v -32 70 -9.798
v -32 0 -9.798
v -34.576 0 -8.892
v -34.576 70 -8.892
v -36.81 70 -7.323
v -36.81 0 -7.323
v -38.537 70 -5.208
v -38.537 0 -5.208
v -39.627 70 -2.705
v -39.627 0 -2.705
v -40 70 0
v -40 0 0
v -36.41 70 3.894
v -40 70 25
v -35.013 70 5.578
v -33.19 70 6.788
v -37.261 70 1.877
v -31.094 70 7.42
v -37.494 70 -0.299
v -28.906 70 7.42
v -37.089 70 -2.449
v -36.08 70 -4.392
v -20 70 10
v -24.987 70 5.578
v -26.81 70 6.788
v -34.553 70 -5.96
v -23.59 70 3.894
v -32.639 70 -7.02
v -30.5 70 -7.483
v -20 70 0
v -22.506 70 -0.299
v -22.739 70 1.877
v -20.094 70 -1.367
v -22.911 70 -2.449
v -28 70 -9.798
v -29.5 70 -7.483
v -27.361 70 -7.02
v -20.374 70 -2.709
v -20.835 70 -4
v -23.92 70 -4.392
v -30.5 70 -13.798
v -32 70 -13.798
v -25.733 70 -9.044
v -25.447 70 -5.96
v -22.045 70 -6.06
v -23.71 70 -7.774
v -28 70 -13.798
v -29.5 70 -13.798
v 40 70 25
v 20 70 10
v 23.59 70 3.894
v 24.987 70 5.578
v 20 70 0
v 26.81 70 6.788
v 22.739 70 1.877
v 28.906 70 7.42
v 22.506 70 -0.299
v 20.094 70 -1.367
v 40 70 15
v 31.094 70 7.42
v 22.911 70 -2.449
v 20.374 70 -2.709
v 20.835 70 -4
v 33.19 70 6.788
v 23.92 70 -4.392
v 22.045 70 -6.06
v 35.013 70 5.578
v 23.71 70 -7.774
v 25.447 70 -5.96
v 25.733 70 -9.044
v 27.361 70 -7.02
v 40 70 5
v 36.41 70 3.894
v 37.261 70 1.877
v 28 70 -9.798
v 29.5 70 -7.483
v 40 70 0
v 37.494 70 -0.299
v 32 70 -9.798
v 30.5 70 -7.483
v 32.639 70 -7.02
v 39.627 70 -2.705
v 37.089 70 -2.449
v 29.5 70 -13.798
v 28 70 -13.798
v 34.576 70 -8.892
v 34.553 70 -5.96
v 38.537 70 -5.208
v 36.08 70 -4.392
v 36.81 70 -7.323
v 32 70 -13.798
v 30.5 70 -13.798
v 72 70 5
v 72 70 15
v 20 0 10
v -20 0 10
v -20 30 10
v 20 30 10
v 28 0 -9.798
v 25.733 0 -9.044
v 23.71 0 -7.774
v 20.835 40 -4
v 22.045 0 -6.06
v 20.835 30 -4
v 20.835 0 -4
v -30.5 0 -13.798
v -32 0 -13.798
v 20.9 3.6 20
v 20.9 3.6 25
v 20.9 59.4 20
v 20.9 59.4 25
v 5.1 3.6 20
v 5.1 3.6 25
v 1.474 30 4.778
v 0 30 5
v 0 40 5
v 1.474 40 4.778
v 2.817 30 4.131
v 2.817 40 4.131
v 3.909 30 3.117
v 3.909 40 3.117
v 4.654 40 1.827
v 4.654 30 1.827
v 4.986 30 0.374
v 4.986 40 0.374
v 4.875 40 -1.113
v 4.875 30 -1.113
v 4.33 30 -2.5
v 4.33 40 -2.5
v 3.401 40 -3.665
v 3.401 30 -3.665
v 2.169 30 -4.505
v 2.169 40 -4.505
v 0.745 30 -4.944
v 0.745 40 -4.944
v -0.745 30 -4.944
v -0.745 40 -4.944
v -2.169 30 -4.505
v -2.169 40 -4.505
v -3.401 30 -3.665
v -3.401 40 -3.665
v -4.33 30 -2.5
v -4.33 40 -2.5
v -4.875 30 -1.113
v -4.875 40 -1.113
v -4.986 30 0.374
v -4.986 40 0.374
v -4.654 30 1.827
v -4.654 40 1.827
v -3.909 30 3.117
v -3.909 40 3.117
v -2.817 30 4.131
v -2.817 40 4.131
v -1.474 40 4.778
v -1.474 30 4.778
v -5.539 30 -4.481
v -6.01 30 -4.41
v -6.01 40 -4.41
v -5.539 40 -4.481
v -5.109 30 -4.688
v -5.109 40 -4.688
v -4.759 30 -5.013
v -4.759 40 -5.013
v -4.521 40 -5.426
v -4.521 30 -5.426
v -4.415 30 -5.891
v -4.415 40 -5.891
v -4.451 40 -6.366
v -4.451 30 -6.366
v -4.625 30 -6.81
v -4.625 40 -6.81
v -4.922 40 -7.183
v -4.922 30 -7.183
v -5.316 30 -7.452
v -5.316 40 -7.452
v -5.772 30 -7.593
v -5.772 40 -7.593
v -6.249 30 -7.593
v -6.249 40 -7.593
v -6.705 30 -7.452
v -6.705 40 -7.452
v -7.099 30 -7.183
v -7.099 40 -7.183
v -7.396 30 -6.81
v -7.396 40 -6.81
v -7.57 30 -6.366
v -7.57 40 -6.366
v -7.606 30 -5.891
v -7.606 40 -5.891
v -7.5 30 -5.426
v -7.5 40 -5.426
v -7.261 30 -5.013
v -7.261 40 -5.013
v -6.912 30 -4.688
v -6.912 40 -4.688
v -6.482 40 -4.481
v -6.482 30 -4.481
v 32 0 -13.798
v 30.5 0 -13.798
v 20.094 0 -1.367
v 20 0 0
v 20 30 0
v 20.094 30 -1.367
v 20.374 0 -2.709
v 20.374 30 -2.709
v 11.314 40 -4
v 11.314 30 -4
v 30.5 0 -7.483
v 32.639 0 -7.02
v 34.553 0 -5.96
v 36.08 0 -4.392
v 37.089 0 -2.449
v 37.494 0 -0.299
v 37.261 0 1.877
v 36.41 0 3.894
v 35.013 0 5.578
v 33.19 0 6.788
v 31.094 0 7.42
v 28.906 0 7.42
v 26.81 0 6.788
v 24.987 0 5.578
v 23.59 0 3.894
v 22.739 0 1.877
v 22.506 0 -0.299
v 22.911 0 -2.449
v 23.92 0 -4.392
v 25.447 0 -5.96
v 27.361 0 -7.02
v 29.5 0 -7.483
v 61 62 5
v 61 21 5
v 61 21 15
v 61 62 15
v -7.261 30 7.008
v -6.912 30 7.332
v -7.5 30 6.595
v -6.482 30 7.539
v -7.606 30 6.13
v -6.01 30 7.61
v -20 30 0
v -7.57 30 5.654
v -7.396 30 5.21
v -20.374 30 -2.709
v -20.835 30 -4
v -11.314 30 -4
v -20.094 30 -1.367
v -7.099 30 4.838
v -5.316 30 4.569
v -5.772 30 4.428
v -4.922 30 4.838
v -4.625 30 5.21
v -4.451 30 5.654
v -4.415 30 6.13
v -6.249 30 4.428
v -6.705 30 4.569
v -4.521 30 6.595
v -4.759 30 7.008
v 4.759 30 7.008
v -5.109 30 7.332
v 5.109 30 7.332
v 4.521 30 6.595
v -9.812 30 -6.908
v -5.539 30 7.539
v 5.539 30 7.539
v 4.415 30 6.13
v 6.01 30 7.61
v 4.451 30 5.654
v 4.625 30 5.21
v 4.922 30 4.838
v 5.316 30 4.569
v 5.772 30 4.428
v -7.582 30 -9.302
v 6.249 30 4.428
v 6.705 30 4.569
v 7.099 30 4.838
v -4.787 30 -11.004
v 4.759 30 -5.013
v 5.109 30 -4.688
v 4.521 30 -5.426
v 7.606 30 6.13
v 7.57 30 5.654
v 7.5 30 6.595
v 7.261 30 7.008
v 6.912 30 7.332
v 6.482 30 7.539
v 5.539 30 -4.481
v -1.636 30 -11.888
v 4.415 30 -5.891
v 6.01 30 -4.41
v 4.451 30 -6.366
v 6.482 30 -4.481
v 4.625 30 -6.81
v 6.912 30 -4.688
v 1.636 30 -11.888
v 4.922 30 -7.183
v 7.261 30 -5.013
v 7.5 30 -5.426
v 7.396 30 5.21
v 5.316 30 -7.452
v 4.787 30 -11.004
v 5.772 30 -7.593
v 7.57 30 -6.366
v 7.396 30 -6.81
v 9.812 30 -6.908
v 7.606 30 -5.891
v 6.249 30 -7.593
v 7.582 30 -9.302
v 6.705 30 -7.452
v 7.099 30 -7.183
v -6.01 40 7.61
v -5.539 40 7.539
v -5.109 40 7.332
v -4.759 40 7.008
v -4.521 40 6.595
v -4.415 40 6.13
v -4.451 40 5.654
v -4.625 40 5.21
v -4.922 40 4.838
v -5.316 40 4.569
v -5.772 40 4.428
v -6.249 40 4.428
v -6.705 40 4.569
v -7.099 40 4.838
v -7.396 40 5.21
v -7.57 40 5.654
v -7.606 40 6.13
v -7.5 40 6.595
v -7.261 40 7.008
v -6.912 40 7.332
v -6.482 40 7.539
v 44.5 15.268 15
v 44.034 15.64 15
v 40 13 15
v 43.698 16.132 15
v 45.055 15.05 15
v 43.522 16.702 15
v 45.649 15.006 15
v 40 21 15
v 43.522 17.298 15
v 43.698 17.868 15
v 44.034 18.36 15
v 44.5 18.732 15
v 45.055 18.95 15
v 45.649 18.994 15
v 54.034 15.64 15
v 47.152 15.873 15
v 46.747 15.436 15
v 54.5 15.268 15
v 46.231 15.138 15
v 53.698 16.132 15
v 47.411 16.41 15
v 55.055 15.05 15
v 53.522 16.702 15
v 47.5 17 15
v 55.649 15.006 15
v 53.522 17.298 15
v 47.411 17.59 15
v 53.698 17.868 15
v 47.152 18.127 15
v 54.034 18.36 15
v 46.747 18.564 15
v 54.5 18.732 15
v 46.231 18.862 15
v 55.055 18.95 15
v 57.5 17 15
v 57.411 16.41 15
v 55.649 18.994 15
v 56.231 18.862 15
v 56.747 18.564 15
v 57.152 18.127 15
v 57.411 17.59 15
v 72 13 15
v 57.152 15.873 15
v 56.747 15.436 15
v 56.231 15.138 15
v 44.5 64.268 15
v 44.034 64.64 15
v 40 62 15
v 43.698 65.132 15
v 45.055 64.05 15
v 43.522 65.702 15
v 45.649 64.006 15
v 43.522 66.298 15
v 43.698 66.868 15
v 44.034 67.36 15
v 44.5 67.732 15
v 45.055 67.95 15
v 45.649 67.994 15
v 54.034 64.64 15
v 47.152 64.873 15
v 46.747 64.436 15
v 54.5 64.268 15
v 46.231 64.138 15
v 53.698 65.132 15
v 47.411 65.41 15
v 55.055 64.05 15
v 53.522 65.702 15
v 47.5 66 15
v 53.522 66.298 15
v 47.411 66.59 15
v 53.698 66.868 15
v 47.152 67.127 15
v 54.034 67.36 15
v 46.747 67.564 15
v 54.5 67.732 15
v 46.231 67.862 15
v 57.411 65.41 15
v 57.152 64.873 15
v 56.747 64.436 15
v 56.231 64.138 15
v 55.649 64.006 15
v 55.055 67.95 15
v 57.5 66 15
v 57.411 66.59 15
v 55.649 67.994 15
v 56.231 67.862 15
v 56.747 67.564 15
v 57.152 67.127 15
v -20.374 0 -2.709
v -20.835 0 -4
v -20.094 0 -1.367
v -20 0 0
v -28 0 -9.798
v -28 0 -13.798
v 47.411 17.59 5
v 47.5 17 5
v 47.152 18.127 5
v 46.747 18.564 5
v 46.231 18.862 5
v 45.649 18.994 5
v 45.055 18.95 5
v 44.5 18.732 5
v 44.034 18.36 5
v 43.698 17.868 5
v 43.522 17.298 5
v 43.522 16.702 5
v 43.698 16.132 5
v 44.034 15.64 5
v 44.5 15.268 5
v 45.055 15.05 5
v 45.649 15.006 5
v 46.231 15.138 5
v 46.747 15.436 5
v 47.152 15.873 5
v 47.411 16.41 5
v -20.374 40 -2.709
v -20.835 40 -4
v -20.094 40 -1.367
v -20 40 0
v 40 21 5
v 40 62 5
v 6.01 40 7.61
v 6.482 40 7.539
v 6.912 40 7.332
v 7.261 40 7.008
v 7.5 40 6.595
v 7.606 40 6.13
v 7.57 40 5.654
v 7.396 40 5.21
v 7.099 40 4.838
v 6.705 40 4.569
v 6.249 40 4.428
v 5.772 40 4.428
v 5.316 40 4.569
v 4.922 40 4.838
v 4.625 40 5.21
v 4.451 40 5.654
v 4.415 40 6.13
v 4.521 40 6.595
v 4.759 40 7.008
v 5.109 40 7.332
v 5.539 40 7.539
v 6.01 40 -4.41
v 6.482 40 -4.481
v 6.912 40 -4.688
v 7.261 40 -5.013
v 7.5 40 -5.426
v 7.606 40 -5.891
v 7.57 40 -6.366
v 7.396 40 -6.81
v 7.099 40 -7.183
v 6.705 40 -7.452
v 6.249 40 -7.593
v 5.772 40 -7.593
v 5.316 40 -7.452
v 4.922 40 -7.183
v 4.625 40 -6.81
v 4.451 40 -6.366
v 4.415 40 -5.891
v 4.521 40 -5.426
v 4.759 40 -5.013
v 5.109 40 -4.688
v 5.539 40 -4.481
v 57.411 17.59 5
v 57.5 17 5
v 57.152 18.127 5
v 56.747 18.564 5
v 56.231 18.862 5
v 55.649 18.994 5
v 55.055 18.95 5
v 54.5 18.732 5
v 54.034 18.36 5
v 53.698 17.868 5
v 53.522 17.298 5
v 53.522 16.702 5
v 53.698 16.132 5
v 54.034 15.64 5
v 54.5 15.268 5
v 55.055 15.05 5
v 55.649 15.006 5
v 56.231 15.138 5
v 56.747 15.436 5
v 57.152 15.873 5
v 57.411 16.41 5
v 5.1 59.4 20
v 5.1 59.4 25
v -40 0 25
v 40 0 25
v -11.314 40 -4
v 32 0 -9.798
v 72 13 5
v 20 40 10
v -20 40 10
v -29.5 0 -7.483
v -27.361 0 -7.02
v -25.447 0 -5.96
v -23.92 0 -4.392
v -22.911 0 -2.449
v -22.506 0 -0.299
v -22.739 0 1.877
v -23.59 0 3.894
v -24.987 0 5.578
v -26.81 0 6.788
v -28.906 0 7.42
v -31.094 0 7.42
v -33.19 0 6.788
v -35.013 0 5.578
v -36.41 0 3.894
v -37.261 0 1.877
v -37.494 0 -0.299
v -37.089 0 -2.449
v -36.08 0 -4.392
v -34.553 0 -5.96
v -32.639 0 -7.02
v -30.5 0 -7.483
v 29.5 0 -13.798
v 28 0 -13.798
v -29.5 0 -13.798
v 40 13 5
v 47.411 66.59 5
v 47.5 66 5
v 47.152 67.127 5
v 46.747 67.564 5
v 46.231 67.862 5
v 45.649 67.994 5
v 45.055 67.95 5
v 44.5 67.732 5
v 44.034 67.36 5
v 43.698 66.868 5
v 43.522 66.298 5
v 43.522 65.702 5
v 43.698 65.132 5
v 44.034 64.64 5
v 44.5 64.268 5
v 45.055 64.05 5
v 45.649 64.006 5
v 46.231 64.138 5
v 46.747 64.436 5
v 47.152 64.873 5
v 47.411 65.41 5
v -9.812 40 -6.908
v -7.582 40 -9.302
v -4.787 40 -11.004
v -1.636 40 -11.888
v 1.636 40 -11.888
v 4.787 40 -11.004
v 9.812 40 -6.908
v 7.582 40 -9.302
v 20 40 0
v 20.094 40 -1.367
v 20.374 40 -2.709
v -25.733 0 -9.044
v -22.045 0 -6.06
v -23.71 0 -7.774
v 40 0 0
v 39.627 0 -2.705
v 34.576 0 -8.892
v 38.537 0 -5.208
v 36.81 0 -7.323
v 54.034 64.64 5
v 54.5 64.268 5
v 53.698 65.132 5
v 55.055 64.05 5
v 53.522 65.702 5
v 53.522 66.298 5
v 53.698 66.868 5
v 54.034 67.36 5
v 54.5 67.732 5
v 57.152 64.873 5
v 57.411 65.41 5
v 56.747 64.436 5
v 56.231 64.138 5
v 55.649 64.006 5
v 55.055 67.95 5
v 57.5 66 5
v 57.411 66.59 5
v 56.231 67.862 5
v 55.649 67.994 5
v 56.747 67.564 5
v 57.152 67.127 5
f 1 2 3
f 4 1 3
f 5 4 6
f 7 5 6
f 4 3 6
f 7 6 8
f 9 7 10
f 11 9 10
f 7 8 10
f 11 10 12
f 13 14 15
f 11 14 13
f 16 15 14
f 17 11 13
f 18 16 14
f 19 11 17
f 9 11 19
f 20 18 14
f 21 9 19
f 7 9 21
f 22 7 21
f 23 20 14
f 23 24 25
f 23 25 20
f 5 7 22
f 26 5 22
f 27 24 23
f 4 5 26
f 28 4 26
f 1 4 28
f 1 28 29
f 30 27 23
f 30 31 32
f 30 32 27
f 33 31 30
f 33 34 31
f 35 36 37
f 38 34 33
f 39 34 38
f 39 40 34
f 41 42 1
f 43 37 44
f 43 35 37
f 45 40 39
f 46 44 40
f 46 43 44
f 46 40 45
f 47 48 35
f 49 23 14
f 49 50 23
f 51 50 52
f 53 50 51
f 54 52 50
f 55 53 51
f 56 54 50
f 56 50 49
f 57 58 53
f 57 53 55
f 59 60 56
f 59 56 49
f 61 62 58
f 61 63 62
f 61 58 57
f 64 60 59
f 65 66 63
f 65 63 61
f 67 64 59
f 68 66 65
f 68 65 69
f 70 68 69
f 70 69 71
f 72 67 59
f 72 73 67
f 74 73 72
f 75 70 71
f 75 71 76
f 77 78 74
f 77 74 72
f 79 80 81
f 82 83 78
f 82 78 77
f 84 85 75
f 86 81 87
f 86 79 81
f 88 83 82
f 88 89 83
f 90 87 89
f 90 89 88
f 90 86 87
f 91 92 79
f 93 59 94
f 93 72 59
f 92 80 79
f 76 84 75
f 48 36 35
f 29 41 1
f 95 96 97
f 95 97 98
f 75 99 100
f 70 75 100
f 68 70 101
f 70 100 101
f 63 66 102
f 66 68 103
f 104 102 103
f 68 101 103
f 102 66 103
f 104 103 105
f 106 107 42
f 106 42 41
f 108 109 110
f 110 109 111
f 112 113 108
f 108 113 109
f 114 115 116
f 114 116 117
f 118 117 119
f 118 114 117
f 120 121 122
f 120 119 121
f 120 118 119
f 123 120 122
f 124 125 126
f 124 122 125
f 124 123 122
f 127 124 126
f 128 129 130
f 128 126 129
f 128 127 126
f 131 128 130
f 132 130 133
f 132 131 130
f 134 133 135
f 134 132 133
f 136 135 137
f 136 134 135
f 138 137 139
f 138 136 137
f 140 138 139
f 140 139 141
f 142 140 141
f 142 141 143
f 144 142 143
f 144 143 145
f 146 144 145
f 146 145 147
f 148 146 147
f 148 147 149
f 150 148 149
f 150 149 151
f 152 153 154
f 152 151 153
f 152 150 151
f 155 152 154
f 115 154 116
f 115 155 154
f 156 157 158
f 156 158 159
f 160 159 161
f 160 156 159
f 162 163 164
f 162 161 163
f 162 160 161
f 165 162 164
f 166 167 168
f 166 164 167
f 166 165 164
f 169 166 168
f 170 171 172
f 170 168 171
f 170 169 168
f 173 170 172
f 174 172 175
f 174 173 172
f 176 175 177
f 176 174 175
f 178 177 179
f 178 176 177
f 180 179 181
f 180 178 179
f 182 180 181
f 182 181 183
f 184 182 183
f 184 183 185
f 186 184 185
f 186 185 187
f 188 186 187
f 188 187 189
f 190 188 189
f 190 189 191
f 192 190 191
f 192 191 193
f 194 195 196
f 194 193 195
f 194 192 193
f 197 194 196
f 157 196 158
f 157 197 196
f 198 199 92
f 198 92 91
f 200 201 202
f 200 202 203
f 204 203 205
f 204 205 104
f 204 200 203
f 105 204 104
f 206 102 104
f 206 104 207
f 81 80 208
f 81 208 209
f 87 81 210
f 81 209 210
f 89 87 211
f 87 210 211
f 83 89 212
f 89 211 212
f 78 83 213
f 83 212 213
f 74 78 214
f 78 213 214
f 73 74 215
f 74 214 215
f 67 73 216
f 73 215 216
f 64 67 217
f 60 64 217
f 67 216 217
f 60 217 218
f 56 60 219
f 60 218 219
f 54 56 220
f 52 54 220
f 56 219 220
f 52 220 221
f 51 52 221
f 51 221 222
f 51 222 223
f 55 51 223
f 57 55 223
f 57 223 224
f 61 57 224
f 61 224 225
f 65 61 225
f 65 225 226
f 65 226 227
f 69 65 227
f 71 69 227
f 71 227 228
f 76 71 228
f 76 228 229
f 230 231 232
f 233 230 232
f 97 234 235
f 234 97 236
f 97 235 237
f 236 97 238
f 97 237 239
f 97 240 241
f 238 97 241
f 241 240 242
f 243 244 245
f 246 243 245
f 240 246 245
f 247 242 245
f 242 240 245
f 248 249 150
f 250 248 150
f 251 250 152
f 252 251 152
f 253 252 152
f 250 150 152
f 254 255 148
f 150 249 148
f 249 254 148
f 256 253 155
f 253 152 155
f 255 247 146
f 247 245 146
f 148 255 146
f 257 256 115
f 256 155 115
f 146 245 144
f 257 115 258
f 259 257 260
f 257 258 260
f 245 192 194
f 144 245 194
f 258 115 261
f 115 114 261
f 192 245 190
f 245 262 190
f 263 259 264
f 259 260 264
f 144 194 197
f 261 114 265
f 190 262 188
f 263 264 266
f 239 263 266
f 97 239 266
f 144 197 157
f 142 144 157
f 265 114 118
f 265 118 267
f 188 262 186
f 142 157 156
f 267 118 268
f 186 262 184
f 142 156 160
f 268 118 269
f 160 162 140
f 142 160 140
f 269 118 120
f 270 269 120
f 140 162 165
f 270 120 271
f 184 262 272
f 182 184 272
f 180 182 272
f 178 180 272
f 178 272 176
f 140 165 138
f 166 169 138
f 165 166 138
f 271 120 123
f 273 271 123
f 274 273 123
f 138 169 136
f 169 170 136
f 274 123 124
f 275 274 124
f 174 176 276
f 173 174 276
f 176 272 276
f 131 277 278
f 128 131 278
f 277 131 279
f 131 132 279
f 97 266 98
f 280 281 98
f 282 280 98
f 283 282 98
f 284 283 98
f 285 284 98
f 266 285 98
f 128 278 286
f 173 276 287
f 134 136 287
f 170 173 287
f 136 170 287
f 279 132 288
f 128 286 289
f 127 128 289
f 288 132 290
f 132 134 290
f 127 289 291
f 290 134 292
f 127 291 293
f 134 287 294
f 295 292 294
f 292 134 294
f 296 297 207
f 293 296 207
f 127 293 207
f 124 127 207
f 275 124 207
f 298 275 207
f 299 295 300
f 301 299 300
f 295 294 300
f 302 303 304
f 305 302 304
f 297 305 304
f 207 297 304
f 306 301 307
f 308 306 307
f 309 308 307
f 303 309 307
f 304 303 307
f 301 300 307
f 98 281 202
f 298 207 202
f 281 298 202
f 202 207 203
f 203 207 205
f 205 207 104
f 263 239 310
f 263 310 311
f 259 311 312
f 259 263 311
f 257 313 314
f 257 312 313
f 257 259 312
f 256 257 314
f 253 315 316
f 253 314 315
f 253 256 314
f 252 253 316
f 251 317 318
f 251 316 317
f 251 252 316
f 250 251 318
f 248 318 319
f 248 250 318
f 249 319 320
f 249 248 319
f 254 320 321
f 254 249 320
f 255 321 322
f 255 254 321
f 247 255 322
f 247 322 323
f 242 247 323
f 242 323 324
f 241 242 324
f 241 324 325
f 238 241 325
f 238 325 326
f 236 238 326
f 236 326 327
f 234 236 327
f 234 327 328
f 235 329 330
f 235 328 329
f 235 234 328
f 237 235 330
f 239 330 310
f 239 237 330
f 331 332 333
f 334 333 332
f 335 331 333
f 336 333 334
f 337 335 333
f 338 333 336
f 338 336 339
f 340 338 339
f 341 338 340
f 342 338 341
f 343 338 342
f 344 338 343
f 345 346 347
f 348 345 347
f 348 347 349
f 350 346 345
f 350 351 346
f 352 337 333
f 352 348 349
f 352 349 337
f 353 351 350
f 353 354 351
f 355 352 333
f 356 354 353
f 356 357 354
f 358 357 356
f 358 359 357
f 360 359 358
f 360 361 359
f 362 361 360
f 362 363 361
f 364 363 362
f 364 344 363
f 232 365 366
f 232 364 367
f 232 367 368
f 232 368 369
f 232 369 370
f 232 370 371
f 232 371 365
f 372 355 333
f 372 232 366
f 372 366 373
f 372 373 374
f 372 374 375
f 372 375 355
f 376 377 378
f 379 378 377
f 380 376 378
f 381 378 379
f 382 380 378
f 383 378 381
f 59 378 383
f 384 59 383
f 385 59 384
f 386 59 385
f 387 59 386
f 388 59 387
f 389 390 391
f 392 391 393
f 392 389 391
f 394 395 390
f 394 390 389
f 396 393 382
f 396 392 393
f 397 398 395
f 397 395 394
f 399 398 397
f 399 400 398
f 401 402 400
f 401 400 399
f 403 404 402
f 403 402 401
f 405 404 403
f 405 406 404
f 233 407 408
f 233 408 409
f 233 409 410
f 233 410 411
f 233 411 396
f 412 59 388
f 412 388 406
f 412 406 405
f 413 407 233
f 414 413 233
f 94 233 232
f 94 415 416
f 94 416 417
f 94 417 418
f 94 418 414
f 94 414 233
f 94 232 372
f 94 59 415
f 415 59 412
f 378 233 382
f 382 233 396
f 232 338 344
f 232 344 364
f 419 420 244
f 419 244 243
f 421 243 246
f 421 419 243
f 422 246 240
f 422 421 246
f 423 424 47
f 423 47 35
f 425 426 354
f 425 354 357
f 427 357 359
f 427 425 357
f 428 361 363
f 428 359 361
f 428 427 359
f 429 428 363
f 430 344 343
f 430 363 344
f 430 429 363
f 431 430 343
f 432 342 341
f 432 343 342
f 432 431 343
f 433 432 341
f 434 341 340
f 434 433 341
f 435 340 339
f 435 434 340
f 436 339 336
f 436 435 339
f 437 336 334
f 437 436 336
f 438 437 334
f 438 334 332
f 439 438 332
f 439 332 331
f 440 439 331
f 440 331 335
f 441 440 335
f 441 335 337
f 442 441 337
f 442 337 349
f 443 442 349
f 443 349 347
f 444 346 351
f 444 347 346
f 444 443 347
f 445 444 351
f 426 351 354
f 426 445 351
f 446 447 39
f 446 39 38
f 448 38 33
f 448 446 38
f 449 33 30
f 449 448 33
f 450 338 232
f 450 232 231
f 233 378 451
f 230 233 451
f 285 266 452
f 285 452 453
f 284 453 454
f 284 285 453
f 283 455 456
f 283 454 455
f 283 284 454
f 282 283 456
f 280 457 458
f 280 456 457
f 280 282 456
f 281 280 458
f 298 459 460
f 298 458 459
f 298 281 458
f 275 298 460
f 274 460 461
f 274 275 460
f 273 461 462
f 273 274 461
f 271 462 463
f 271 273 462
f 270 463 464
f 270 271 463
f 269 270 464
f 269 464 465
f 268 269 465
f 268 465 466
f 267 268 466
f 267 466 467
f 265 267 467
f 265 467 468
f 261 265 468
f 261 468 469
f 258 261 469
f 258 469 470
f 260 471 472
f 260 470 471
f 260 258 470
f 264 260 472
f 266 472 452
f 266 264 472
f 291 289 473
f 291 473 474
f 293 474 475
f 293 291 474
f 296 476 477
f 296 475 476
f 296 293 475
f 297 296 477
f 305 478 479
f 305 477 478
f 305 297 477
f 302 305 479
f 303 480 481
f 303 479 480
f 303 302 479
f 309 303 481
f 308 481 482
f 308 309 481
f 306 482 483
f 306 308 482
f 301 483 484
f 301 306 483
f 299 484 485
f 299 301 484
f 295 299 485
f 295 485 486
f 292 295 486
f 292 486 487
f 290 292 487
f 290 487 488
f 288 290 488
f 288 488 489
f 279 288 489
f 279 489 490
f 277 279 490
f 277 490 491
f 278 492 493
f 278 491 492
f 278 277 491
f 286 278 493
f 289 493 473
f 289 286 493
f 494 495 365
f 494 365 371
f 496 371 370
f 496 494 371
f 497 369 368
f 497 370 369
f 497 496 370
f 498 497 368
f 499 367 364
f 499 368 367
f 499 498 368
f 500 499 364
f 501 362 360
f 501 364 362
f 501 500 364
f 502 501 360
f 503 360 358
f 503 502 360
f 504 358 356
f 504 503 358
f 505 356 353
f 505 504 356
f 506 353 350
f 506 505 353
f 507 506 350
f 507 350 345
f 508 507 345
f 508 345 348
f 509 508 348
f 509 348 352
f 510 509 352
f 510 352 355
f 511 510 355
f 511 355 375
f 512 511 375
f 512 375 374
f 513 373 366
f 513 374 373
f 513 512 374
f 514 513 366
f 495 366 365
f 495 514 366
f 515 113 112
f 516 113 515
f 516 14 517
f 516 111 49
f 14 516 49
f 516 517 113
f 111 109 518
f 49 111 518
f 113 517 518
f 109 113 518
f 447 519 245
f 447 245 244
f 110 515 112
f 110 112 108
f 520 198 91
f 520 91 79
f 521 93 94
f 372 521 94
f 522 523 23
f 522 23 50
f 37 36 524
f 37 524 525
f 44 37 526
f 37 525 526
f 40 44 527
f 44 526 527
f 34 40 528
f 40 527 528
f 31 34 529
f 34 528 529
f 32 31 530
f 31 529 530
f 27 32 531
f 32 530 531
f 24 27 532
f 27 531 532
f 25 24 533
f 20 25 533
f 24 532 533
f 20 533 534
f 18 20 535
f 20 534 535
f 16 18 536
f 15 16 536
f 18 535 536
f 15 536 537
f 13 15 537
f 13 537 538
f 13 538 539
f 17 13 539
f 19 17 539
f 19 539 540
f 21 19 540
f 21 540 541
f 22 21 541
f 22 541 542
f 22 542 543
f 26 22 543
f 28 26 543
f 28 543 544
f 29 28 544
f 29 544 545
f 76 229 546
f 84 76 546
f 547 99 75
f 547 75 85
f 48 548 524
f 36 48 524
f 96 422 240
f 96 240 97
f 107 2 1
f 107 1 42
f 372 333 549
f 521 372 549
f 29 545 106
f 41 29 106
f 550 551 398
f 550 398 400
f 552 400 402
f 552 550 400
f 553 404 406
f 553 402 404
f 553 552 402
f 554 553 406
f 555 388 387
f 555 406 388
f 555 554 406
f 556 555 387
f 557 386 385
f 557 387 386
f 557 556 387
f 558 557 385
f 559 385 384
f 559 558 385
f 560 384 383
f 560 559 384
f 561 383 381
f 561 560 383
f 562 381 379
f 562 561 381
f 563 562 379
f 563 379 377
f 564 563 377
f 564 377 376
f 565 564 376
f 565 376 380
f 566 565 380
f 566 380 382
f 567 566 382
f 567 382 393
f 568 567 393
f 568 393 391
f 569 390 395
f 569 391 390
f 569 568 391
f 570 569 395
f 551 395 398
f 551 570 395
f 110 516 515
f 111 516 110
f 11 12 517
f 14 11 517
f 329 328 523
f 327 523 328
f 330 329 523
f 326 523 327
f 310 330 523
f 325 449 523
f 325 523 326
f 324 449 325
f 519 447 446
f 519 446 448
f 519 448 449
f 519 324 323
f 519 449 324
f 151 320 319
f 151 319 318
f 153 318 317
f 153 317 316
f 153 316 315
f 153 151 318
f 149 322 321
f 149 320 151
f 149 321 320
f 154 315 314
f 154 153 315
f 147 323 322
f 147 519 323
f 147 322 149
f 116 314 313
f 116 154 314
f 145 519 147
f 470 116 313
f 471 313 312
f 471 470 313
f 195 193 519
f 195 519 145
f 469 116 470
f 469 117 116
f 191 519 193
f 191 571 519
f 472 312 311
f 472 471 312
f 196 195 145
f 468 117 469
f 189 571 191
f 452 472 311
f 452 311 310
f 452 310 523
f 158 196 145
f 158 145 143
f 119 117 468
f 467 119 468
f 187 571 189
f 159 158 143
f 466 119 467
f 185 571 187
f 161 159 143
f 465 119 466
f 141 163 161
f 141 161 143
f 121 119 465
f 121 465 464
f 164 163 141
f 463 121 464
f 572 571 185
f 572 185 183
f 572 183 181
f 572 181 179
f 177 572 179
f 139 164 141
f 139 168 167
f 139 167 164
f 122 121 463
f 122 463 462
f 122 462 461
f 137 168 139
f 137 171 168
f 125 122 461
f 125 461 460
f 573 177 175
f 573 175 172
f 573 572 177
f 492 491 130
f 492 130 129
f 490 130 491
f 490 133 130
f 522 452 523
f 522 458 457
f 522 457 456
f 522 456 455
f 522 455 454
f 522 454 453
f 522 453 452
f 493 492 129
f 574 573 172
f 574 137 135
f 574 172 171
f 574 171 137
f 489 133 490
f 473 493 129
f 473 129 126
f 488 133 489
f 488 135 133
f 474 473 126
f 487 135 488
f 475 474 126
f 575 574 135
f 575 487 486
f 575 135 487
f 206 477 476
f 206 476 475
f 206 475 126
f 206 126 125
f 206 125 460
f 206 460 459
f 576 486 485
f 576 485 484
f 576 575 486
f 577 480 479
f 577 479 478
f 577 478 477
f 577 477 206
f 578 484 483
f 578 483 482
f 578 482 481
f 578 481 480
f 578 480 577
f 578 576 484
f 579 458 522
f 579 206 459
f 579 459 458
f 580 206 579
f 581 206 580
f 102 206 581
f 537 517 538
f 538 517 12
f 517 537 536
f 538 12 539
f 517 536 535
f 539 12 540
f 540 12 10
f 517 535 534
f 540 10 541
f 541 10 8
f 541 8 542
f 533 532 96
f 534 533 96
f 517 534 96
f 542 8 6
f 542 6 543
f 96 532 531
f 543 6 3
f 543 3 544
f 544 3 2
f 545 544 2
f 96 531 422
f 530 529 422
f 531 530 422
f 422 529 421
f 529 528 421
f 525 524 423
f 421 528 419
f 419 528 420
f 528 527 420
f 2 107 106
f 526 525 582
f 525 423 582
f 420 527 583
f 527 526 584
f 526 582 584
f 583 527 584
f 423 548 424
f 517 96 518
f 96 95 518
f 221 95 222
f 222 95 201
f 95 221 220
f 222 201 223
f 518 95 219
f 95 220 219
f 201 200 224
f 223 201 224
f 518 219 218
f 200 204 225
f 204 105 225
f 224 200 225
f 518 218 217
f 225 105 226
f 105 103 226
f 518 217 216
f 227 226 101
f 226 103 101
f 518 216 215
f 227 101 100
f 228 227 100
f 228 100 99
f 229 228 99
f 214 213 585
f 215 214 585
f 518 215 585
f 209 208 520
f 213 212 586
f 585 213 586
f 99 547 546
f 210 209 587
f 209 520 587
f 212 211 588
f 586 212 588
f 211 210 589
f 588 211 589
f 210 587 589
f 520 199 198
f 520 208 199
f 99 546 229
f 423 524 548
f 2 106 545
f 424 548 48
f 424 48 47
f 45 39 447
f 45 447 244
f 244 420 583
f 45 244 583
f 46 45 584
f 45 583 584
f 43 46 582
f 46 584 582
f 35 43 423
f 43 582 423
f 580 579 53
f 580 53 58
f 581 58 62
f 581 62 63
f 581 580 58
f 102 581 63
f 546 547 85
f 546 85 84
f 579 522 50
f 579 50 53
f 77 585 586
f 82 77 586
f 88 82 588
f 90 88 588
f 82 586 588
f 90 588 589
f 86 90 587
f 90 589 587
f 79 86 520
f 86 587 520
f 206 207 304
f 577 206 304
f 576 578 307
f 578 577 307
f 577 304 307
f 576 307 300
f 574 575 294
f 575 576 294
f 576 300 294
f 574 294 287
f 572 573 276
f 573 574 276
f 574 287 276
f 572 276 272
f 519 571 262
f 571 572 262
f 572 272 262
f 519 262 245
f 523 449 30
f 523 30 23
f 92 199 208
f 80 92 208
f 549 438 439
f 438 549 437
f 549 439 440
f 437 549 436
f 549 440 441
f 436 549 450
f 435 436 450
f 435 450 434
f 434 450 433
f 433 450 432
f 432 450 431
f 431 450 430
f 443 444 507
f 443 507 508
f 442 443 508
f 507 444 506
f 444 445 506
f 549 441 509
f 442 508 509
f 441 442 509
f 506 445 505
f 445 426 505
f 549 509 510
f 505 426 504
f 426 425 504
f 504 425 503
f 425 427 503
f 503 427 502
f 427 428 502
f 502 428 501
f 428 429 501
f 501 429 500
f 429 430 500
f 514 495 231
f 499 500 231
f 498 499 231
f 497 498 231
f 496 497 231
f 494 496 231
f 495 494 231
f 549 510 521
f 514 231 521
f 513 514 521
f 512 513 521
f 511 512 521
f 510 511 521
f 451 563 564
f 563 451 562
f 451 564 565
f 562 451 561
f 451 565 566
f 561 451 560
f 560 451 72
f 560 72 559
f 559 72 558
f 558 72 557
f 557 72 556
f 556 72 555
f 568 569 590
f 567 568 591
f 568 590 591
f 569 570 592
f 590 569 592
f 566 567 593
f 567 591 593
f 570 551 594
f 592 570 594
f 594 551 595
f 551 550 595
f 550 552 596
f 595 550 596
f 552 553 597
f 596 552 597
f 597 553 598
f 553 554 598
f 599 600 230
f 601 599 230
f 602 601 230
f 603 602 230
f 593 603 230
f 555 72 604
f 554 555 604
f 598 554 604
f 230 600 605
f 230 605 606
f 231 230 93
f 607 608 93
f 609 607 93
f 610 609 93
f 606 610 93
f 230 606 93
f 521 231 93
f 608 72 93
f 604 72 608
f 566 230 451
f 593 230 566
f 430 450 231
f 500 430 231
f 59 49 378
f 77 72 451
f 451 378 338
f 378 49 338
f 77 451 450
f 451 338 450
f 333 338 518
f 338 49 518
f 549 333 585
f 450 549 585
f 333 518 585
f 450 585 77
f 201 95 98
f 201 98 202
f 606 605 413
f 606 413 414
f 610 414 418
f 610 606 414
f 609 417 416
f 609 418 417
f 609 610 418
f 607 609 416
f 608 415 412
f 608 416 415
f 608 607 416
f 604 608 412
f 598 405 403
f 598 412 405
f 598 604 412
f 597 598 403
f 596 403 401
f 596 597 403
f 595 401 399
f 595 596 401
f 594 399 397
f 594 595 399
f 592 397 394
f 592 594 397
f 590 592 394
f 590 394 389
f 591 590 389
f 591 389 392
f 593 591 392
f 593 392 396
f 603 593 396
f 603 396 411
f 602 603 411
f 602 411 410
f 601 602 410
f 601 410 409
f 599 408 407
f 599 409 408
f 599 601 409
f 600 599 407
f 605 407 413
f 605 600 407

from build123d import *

# Parameters (mm, degrees)
SALIENTE_EXTRUIR1_DEPTH    = 70
SALIENTE_EXTRUIR2_START    = -70
SALIENTE_EXTRUIR2_DEPTH    = 70
CORTAR_EXTRUIR2_DEPTH      = 85.409715081
CORTAR_EXTRUIR2_DEPTH_BACK = 85.409715081
CORTAR_EXTRUIR3_START      = -30
CORTAR_EXTRUIR3_DEPTH      = 30
CORTAR_EXTRUIR6_DEPTH      = 30
CORTAR_EXTRUIR4_DEPTH      = 85.409715081
CORTAR_EXTRUIR4_DEPTH_BACK = 85.409715081
CROQUIS6_R                 = 5
CROQUIS6_R_2               = 1.6
CROQUIS7_W                 = 10
CROQUIS7_H                 = 8
SALIENTE_EXTRUIR3_DEPTH    = 32
CORTAR_EXTRUIR5_DEPTH      = 105.466848526
CORTAR_EXTRUIR5_DEPTH_BACK = 105.466848526
CROQUIS8_R                 = 2
SALIENTE_EXTRUIR4_REACH    = 100.25
CROQUIS10_W                = 11
CROQUIS10_H                = 10
CROQUIS12_W                = 15.8
CROQUIS12_H                = 55.8
CORTAR_EXTRUIR7_DEPTH      = 5


with BuildPart() as part:
    # Croquis1 → Saliente-Extruir1 (new body)
    with BuildSketch(Plane(origin=(0, 0, 0), x_dir=(1, 0, 0), z_dir=(0, 1, 0))):
        with BuildLine():
            Line((40, -25), (40, 0))
            ThreePointArc((40, 0), (32.043096437, 9.789063129), (20.83484861, 4))
            Line((20.83484861, 4), (11.313708499, 4))
            ThreePointArc((11.313708499, 4), (0, 12), (-11.313708499, 4))
            Line((-11.313708499, 4), (-20.83484861, 4))
            ThreePointArc((-20.83484861, 4), (-32.043096437, 9.789063129), (-40, 0))
            Line((-40, 0), (-40, -25))
            Line((-40, -25), (40, -25))
        make_face()
    extrude(amount=SALIENTE_EXTRUIR1_DEPTH)

    # Croquis3 → Saliente-Extruir2 (add)
    with BuildSketch(Plane(origin=(0, 70, 0), x_dir=(1, 0, 0), z_dir=(0, 1, 0)).offset(SALIENTE_EXTRUIR2_START)):
        with BuildLine():
            Line((-32, 9.797958971), (-32, 13.797958971))
            Line((-32, 13.797958971), (-28, 13.797958971))
            Line((-28, 13.797958971), (-28, 9.797958971))
            ThreePointArc((-28, 9.797958971), (-30, 10), (-32, 9.797958971))
        make_face()
        with BuildLine():
            Line((28, 9.797958971), (28, 13.797958971))
            Line((28, 13.797958971), (32, 13.797958971))
            Line((32, 13.797958971), (32, 9.797958971))
            ThreePointArc((32, 9.797958971), (30, 10), (28, 9.797958971))
        make_face()
    extrude(amount=SALIENTE_EXTRUIR2_DEPTH)

    # Croquis4 → Cortar-Extruir2 (cut, two sides: drawn at the far end of the back side and taken through both)
    with BuildSketch(Plane(origin=(0, 70, 0), x_dir=(1, 0, 0), z_dir=(0, 1, 0)).offset(-CORTAR_EXTRUIR2_DEPTH_BACK)):
        with BuildLine():
            Line((-30.5, 7.483314774), (-30.5, 14.654769407))
            Line((-30.5, 14.654769407), (-29.5, 14.654769407))
            Line((-29.5, 14.654769407), (-29.5, 7.483314774))
            ThreePointArc((-29.5, 7.483314774), (-30, -7.5), (-30.5, 7.483314774))
        make_face()
        with BuildLine():
            Line((29.5, 7.483314774), (29.5, 14.654769407))
            Line((29.5, 14.654769407), (30.5, 14.654769407))
            Line((30.5, 14.654769407), (30.5, 7.483314774))
            ThreePointArc((30.5, 7.483314774), (30, -7.5), (29.5, 7.483314774))
        make_face()
    extrude(amount=CORTAR_EXTRUIR2_DEPTH + CORTAR_EXTRUIR2_DEPTH_BACK, mode=Mode.SUBTRACT)

    # Croquis5 → Cortar-Extruir3 (cut)
    with BuildSketch(Plane(origin=(0, 70, 0), x_dir=(1, 0, 0), z_dir=(0, 1, 0)).offset(CORTAR_EXTRUIR3_START)):
        with BuildLine():
            Line((-20, 0), (-20, -10))
            Line((-20, -10), (20, -10))
            Line((20, -10), (20, 0))
            ThreePointArc((20, 0), (20.210936871, 2.043096437), (20.83484861, 4))
            Line((20.83484861, 4), (20.83484861, 13.99599321))
            Line((20.83484861, 13.99599321), (-20.83484861, 13.99599321))
            Line((-20.83484861, 13.99599321), (-20.83484861, 4))
            ThreePointArc((-20.83484861, 4), (-20.210936871, 2.043096437), (-20, 0))
        make_face()
    extrude(amount=CORTAR_EXTRUIR3_DEPTH, mode=Mode.SUBTRACT)

    # Croquis9 → Cortar-Extruir6 (cut)
    with BuildSketch(Plane(origin=(0, 0, 0), x_dir=(1, 0, 0), z_dir=(0, 1, 0))):
        with BuildLine():
            Line((-20, 0), (-20, -10))
            Line((-20, -10), (20, -10))
            Line((20, -10), (20, 0))
            ThreePointArc((20, 0), (20.210936871, 2.043096437), (20.83484861, 4))
            Line((20.83484861, 4), (20.83484861, 13.99599321))
            Line((20.83484861, 13.99599321), (-20.83484861, 13.99599321))
            Line((-20.83484861, 13.99599321), (-20.83484861, 4))
            ThreePointArc((-20.83484861, 4), (-20.210936871, 2.043096437), (-20, 0))
        make_face()
    extrude(amount=CORTAR_EXTRUIR6_DEPTH, mode=Mode.SUBTRACT)

    # Croquis6 → Cortar-Extruir4 (cut, two sides: drawn at the far end of the back side and taken through both)
    with BuildSketch(Plane(origin=(0, 70, 0), x_dir=(1, 0, 0), z_dir=(0, 1, 0)).offset(-CORTAR_EXTRUIR4_DEPTH_BACK)):
        with Locations(Location((0, 0, 0), (0, 0, 270))):
            Circle(CROQUIS6_R)
        with Locations(Location((-6.01040764, 6.01040764, 0), (0, 0, 270))):
            Circle(CROQUIS6_R_2)
        with Locations(Location((6.01040764, 6.01040764, 0), (0, 0, 270))):
            Circle(CROQUIS6_R_2)
        with Locations(Location((6.01040764, -6.01040764, 0), (0, 0, 270))):
            Circle(CROQUIS6_R_2)
        with Locations(Location((-6.01040764, -6.01040764, 0), (0, 0, 270))):
            Circle(CROQUIS6_R_2)
    extrude(amount=CORTAR_EXTRUIR4_DEPTH + CORTAR_EXTRUIR4_DEPTH_BACK, mode=Mode.SUBTRACT)

    # Croquis7 → Saliente-Extruir3 (add)
    with BuildSketch(Plane(origin=(40, 0, 0), x_dir=(0, 0, -1), z_dir=(1, 0, 0))):
        with Locations((-10, 66)):
            Rectangle(CROQUIS7_W, CROQUIS7_H)
        with Locations((-10, 17)):
            Rectangle(CROQUIS7_W, CROQUIS7_H)
    extrude(amount=SALIENTE_EXTRUIR3_DEPTH)

    # Croquis8 → Cortar-Extruir5 (cut, two sides: drawn at the far end of the back side and taken through both)
    with BuildSketch(Plane.XY.offset(15).offset(-CORTAR_EXTRUIR5_DEPTH_BACK)):
        with Locations((45.5, 66)):
            Circle(CROQUIS8_R)
        with Locations((55.5, 66)):
            Circle(CROQUIS8_R)
        with Locations((45.5, 17)):
            Circle(CROQUIS8_R)
        with Locations((55.5, 17)):
            Circle(CROQUIS8_R)
    extrude(amount=CORTAR_EXTRUIR5_DEPTH + CORTAR_EXTRUIR5_DEPTH_BACK, mode=Mode.SUBTRACT)

    # Croquis10 → Saliente-Extruir4 (add, up to next)
    with BuildSketch(Plane.XZ.offset(-62), mode=Mode.PRIVATE) as saliente_extruir4_sk1:
        with Locations((66.5, 10)):
            Rectangle(CROQUIS10_W, CROQUIS10_H)
    saliente_extruir4_tool1 = extrude(saliente_extruir4_sk1.sketch, amount=SALIENTE_EXTRUIR4_REACH, mode=Mode.PRIVATE) - part.part
    add(saliente_extruir4_tool1.solids().sort_by_distance((66.5, 62, 10))[0])

    # Croquis12 → Cortar-Extruir7 (cut)
    with BuildSketch(Plane.XY.offset(25)):
        with Locations((13, 31.5)):
            Rectangle(CROQUIS12_W, CROQUIS12_H)
    extrude(amount=-CORTAR_EXTRUIR7_DEPTH, mode=Mode.SUBTRACT)


solid = part.part
